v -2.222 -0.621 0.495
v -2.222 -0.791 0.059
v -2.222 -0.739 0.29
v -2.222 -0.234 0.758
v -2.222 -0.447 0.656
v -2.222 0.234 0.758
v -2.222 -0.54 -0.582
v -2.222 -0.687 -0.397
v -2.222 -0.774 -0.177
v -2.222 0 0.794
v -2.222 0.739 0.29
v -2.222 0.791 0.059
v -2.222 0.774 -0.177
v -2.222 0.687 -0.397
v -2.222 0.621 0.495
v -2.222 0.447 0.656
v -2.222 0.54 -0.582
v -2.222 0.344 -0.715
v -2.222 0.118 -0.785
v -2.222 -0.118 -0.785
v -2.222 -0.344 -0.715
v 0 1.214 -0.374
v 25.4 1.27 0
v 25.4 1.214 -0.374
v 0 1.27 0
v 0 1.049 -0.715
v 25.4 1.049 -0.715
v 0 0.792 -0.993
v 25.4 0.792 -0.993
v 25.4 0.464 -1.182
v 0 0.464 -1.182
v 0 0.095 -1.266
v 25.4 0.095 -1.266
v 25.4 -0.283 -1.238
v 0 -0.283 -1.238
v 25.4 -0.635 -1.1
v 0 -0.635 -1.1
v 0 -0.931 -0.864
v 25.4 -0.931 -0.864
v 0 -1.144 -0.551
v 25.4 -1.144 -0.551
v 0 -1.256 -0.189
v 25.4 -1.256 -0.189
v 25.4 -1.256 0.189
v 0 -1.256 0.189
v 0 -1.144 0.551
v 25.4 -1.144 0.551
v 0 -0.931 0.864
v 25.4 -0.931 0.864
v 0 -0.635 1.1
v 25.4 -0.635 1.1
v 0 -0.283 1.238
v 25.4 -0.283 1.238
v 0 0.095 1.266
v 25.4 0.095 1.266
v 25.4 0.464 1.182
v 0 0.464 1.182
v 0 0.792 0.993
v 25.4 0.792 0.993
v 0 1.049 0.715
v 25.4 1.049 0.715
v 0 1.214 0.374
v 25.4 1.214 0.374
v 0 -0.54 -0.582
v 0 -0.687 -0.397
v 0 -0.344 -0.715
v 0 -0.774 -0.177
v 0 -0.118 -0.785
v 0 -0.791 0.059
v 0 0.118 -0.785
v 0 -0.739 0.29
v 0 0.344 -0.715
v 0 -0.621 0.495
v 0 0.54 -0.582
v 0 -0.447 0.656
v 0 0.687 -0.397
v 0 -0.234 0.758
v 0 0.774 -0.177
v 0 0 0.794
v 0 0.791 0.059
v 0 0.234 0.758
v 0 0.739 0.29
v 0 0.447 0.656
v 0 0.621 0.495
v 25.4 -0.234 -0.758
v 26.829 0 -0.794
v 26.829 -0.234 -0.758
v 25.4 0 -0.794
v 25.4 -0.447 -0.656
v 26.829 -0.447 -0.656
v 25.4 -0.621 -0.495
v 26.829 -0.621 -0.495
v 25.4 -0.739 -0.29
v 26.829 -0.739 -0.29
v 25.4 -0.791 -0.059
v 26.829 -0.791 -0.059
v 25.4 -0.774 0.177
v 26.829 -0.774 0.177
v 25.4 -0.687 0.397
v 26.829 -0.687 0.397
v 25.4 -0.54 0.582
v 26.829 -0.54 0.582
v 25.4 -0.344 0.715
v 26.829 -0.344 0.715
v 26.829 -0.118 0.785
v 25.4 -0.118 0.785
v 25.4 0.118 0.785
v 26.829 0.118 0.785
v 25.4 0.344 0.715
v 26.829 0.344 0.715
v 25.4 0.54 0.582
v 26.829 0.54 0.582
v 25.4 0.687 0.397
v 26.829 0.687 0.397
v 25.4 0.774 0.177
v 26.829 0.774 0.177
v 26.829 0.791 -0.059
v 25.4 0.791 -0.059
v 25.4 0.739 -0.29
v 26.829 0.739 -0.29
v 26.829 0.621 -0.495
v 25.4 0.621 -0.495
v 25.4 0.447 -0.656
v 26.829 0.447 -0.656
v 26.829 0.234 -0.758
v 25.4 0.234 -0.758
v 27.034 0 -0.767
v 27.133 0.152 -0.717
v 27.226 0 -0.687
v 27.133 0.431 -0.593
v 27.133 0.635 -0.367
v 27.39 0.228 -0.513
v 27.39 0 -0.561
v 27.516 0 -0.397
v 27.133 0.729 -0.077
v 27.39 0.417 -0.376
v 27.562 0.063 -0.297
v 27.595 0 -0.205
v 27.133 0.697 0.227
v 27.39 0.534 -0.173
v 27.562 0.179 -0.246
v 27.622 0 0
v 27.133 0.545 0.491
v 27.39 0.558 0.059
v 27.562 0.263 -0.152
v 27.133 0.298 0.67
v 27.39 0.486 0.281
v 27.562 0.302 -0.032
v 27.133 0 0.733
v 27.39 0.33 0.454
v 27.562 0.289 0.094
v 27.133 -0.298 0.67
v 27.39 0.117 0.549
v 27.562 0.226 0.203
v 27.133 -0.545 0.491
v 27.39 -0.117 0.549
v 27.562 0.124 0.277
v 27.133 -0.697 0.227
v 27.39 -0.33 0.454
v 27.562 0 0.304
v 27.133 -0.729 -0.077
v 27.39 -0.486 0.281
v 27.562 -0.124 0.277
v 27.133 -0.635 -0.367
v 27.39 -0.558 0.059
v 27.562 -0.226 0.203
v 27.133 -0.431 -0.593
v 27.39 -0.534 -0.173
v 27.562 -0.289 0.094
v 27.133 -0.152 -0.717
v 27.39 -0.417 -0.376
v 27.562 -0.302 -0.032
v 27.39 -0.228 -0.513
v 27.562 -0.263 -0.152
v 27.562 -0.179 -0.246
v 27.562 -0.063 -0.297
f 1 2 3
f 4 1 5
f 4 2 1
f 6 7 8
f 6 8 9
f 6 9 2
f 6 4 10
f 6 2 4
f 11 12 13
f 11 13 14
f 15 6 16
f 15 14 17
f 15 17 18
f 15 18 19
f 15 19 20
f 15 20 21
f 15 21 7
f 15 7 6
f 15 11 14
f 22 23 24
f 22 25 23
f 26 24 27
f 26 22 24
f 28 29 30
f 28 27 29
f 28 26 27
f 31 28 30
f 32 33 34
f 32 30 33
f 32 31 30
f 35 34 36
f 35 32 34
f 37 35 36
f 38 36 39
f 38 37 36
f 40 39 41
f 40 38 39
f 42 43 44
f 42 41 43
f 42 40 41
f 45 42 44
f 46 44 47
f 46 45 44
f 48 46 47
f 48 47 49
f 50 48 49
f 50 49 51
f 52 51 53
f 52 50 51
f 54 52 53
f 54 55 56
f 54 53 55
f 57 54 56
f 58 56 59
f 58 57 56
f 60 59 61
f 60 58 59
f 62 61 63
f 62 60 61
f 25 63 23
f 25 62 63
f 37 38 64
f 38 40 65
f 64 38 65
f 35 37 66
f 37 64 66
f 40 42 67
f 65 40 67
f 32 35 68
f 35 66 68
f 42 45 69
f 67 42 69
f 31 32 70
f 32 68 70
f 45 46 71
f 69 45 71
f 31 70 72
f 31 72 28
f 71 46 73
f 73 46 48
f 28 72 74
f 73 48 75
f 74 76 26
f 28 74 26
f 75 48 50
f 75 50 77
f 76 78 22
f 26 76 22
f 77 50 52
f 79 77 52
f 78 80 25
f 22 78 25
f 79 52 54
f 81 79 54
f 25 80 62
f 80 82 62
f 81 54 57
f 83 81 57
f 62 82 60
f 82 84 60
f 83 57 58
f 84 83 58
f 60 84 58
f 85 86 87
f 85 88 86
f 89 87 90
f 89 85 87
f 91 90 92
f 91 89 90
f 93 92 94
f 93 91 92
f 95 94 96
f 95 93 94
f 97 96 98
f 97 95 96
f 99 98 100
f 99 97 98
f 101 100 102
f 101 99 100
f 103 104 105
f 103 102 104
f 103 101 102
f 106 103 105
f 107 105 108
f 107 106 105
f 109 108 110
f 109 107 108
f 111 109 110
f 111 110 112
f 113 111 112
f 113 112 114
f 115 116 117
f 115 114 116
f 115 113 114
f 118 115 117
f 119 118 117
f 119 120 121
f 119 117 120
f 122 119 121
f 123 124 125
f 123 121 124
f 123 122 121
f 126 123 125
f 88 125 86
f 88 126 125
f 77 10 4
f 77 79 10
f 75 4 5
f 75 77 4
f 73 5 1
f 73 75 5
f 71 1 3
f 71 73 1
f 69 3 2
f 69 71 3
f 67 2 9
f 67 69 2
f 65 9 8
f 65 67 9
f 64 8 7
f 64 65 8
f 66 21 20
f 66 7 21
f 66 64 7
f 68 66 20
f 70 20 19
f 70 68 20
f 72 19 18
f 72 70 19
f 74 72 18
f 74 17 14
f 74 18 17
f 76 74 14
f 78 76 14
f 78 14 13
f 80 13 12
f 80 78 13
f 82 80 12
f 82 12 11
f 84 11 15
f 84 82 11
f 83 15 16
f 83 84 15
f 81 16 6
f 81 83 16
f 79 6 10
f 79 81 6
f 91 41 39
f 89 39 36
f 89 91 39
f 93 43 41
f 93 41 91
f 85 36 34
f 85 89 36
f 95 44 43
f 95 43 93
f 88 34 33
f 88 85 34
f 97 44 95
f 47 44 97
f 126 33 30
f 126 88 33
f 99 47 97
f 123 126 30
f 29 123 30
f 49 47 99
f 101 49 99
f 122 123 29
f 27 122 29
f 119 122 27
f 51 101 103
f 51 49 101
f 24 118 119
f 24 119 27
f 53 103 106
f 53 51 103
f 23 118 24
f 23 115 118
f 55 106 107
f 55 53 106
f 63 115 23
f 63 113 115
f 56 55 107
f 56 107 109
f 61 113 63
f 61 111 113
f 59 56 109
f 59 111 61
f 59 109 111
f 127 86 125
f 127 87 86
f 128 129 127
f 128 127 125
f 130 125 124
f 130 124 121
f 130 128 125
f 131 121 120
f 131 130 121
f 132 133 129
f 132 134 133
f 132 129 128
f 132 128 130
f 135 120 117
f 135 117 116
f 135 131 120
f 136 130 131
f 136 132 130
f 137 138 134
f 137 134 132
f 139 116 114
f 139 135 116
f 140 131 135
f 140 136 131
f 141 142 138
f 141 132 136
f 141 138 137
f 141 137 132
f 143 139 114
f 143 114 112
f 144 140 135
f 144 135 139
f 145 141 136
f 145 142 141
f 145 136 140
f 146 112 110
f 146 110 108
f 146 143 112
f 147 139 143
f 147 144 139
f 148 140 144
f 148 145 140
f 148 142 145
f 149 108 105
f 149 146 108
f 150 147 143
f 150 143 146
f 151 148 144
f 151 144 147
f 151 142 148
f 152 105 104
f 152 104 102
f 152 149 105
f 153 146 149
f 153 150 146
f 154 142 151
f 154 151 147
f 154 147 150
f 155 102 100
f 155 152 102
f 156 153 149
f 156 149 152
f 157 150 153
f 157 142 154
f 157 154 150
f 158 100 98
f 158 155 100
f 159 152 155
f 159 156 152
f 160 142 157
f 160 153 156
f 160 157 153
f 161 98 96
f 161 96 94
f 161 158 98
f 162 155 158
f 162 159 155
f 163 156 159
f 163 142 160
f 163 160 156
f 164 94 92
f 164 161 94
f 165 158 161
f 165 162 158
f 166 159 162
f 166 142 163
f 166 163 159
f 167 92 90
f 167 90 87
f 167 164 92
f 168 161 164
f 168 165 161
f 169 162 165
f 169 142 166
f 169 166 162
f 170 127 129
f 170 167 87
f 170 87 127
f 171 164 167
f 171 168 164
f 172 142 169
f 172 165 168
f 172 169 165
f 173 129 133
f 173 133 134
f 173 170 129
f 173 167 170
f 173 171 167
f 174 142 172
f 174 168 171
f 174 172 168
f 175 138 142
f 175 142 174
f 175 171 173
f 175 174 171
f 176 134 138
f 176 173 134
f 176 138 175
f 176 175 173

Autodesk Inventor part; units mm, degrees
ref_plane "YZ Plane" through (0, 0, 0) normal (1, 0, 0) x (0, 1, 0)
ref_plane "XZ Plane" through (0, 0, 0) normal (0, 1, 0) x (-1, 0, 0)
ref_plane "XY Plane" through (0, 0, 0) normal (0, 0, 1) x (1, 0, 0)
sketch "Sketch1" plane through (0, 0, 0) normal (1, 0, 0) x (0, 1, 0)
  circle A0 centre (0, 0) radius 1.27
  dimension "d0" = 2.54
extrude "Extrusion1" add sketch "Sketch1" along normal blind 25.4
sketch "Sketch2" plane through (25.4, 0, 0) normal (1, 0, 0) x (0, 0, -1)
  circle A0 centre (0, 0) radius 0.7937
  dimension "d3" = 1.5875
extrude "Extrusion2" add sketch "Sketch2" along normal blind 2.2225
sketch "Sketch3" plane through (0, 0, 0) normal (-1, 0, 0) x (0, 0, 1)
  circle A0 centre (0, 0) radius 0.7937
  dimension "d6" = 1.5875
extrude "Extrusion3" add sketch "Sketch3" along normal blind 2.2225
fillet "Fillet1" radius 0.7937 1 edges at (27.6225, 0, 0.7937)
properties part number "Cable (Red)" material "Aluminum 6061"
